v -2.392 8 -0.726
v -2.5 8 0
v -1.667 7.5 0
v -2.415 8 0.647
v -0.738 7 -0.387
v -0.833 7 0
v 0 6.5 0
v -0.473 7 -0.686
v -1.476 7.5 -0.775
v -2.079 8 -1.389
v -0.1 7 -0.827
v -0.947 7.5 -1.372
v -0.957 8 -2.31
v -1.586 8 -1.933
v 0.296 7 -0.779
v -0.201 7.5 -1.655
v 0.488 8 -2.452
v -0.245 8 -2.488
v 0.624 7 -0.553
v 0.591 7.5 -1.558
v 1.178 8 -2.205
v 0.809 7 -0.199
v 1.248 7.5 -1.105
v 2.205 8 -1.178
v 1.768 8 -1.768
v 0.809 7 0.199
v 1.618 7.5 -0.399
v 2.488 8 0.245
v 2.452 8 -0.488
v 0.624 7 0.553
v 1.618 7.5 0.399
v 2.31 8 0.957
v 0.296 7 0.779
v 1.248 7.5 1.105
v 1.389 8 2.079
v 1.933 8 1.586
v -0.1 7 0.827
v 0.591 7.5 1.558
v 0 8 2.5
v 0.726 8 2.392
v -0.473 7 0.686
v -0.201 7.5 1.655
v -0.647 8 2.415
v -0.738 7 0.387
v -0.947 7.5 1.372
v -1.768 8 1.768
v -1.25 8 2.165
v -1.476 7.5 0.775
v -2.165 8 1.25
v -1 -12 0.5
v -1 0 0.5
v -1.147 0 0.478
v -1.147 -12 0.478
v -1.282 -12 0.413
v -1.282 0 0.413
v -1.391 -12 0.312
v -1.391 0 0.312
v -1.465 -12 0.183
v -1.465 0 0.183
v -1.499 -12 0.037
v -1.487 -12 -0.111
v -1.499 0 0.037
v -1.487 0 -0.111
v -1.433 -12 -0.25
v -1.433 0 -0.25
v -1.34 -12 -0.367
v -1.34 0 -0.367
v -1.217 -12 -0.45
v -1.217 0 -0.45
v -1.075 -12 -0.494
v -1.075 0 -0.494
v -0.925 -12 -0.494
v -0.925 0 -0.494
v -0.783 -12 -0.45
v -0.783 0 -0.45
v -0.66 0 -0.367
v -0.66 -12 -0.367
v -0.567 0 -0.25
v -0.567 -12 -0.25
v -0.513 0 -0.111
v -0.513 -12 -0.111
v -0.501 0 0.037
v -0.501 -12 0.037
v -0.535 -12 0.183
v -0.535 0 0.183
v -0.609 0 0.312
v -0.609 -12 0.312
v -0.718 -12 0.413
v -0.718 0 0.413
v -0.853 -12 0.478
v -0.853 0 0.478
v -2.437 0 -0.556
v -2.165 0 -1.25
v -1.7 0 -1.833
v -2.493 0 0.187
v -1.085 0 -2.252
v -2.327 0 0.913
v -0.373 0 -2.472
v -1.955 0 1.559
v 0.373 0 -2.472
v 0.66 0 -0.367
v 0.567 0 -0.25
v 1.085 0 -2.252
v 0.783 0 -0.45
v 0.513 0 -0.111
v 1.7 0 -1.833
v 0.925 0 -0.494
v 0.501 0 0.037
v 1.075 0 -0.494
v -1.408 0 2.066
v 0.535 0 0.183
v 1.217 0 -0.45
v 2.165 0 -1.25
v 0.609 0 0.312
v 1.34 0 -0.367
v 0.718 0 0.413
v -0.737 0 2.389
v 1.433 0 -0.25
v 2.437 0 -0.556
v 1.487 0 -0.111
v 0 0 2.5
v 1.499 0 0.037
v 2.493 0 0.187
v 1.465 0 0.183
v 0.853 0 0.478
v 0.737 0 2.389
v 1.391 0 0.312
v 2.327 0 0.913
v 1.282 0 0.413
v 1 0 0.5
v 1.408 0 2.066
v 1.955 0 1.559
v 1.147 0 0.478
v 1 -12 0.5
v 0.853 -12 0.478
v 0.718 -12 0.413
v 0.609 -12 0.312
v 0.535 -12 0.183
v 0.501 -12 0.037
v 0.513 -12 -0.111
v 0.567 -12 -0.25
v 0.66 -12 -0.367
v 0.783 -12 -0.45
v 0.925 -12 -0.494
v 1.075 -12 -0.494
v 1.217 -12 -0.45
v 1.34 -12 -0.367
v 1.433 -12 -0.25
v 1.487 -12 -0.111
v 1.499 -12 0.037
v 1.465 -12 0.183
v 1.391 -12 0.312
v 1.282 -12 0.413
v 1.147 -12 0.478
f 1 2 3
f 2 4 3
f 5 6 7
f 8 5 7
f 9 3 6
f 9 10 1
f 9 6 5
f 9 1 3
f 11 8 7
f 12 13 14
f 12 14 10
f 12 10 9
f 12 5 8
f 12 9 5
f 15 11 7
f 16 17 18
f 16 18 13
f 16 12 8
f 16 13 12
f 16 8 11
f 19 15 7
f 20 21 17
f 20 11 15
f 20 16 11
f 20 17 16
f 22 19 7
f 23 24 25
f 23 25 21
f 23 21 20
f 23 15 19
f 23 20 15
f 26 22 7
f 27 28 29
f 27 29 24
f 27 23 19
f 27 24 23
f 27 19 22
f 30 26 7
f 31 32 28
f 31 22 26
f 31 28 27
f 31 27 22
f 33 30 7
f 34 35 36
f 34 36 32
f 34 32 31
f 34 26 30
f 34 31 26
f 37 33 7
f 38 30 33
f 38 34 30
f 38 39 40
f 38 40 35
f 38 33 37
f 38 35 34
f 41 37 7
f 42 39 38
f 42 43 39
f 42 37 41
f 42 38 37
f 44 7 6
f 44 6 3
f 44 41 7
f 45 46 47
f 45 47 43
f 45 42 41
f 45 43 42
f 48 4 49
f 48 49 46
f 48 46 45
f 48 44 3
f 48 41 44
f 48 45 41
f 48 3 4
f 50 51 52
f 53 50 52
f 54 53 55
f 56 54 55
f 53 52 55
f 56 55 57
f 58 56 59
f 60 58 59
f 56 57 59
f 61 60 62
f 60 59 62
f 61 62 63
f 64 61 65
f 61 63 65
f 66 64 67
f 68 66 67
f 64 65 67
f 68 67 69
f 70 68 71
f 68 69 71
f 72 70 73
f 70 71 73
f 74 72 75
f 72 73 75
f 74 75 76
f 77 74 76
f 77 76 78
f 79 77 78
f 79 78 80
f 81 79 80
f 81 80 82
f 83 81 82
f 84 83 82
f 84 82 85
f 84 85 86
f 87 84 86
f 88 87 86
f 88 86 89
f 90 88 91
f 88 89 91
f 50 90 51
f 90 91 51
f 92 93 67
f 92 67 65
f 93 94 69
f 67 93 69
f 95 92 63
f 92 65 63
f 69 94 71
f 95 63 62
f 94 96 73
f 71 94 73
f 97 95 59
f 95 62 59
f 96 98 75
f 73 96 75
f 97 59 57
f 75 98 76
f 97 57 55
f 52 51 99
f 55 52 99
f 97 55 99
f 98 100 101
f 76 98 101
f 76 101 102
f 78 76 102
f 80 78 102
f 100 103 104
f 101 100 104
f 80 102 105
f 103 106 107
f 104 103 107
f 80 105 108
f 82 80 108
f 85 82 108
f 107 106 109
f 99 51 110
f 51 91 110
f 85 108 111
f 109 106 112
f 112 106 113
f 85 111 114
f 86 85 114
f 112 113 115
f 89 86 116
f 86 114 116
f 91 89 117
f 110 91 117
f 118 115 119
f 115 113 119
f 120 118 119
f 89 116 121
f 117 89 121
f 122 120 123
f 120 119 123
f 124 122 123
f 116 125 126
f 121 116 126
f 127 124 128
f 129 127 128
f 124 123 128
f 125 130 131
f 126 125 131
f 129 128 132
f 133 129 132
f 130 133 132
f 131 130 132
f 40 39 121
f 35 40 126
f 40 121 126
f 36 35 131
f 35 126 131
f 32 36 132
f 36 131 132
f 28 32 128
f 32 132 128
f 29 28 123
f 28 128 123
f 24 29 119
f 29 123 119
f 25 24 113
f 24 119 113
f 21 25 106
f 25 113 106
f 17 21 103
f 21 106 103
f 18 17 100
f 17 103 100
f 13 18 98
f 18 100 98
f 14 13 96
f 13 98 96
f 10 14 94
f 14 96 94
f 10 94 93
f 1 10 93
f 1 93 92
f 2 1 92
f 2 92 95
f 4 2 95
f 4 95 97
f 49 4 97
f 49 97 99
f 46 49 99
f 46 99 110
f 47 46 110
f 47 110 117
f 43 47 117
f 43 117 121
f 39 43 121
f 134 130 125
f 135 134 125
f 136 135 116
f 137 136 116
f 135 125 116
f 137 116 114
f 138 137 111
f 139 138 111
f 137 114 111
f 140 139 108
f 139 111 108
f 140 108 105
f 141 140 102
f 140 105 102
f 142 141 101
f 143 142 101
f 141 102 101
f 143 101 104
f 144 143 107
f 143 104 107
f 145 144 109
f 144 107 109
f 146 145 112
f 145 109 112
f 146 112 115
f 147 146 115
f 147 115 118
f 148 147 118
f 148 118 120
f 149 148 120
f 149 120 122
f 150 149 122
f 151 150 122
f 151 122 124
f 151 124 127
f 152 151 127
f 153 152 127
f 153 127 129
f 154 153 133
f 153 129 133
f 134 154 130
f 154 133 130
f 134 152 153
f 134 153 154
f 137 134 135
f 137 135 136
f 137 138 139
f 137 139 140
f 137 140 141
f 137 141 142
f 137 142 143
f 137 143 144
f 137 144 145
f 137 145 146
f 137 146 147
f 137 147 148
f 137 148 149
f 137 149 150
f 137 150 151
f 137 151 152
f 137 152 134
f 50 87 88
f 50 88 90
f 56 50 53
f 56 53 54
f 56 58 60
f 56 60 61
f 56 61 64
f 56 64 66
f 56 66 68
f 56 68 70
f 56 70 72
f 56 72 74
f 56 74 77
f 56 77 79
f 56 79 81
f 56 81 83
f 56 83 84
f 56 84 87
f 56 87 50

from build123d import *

# Parameters (mm, degrees)
SKETCH1_R           = 2.5
BOSS_EXTRUDE1_DEPTH = 8
SKETCH3_R           = 0.5
BOSS_EXTRUDE2_DEPTH = 12


with BuildPart() as part:
    # Sketch1 → Boss-Extrude1 (new body)
    with BuildSketch(Plane(origin=(0, 0, 0), x_dir=(1, 0, 0), z_dir=(0, 1, 0))):
        with Locations(Location((0, 0, 0), (0, 0, 270))):
            Circle(SKETCH1_R)
    extrude(amount=BOSS_EXTRUDE1_DEPTH)

    # Sketch2 → Cut-Revolve2 (revolve, cut)
    with BuildSketch(Plane.XY):
        Polygon((0, 8), (0, 6.5), (-2.5, 8), align=None)
    revolve(axis=Axis((0, 8, 0), (0, -1, 0)), mode=Mode.SUBTRACT)

    # Sketch3 → Boss-Extrude2 (add)
    with BuildSketch(Plane.XZ):
        with Locations(Location((-1, 0, 0), (0, 0, 90))):
            Circle(SKETCH3_R)
        with Locations(Location((1, 0, 0), (0, 0, 90))):
            Circle(SKETCH3_R)
    extrude(amount=BOSS_EXTRUDE2_DEPTH)


solid = part.part
